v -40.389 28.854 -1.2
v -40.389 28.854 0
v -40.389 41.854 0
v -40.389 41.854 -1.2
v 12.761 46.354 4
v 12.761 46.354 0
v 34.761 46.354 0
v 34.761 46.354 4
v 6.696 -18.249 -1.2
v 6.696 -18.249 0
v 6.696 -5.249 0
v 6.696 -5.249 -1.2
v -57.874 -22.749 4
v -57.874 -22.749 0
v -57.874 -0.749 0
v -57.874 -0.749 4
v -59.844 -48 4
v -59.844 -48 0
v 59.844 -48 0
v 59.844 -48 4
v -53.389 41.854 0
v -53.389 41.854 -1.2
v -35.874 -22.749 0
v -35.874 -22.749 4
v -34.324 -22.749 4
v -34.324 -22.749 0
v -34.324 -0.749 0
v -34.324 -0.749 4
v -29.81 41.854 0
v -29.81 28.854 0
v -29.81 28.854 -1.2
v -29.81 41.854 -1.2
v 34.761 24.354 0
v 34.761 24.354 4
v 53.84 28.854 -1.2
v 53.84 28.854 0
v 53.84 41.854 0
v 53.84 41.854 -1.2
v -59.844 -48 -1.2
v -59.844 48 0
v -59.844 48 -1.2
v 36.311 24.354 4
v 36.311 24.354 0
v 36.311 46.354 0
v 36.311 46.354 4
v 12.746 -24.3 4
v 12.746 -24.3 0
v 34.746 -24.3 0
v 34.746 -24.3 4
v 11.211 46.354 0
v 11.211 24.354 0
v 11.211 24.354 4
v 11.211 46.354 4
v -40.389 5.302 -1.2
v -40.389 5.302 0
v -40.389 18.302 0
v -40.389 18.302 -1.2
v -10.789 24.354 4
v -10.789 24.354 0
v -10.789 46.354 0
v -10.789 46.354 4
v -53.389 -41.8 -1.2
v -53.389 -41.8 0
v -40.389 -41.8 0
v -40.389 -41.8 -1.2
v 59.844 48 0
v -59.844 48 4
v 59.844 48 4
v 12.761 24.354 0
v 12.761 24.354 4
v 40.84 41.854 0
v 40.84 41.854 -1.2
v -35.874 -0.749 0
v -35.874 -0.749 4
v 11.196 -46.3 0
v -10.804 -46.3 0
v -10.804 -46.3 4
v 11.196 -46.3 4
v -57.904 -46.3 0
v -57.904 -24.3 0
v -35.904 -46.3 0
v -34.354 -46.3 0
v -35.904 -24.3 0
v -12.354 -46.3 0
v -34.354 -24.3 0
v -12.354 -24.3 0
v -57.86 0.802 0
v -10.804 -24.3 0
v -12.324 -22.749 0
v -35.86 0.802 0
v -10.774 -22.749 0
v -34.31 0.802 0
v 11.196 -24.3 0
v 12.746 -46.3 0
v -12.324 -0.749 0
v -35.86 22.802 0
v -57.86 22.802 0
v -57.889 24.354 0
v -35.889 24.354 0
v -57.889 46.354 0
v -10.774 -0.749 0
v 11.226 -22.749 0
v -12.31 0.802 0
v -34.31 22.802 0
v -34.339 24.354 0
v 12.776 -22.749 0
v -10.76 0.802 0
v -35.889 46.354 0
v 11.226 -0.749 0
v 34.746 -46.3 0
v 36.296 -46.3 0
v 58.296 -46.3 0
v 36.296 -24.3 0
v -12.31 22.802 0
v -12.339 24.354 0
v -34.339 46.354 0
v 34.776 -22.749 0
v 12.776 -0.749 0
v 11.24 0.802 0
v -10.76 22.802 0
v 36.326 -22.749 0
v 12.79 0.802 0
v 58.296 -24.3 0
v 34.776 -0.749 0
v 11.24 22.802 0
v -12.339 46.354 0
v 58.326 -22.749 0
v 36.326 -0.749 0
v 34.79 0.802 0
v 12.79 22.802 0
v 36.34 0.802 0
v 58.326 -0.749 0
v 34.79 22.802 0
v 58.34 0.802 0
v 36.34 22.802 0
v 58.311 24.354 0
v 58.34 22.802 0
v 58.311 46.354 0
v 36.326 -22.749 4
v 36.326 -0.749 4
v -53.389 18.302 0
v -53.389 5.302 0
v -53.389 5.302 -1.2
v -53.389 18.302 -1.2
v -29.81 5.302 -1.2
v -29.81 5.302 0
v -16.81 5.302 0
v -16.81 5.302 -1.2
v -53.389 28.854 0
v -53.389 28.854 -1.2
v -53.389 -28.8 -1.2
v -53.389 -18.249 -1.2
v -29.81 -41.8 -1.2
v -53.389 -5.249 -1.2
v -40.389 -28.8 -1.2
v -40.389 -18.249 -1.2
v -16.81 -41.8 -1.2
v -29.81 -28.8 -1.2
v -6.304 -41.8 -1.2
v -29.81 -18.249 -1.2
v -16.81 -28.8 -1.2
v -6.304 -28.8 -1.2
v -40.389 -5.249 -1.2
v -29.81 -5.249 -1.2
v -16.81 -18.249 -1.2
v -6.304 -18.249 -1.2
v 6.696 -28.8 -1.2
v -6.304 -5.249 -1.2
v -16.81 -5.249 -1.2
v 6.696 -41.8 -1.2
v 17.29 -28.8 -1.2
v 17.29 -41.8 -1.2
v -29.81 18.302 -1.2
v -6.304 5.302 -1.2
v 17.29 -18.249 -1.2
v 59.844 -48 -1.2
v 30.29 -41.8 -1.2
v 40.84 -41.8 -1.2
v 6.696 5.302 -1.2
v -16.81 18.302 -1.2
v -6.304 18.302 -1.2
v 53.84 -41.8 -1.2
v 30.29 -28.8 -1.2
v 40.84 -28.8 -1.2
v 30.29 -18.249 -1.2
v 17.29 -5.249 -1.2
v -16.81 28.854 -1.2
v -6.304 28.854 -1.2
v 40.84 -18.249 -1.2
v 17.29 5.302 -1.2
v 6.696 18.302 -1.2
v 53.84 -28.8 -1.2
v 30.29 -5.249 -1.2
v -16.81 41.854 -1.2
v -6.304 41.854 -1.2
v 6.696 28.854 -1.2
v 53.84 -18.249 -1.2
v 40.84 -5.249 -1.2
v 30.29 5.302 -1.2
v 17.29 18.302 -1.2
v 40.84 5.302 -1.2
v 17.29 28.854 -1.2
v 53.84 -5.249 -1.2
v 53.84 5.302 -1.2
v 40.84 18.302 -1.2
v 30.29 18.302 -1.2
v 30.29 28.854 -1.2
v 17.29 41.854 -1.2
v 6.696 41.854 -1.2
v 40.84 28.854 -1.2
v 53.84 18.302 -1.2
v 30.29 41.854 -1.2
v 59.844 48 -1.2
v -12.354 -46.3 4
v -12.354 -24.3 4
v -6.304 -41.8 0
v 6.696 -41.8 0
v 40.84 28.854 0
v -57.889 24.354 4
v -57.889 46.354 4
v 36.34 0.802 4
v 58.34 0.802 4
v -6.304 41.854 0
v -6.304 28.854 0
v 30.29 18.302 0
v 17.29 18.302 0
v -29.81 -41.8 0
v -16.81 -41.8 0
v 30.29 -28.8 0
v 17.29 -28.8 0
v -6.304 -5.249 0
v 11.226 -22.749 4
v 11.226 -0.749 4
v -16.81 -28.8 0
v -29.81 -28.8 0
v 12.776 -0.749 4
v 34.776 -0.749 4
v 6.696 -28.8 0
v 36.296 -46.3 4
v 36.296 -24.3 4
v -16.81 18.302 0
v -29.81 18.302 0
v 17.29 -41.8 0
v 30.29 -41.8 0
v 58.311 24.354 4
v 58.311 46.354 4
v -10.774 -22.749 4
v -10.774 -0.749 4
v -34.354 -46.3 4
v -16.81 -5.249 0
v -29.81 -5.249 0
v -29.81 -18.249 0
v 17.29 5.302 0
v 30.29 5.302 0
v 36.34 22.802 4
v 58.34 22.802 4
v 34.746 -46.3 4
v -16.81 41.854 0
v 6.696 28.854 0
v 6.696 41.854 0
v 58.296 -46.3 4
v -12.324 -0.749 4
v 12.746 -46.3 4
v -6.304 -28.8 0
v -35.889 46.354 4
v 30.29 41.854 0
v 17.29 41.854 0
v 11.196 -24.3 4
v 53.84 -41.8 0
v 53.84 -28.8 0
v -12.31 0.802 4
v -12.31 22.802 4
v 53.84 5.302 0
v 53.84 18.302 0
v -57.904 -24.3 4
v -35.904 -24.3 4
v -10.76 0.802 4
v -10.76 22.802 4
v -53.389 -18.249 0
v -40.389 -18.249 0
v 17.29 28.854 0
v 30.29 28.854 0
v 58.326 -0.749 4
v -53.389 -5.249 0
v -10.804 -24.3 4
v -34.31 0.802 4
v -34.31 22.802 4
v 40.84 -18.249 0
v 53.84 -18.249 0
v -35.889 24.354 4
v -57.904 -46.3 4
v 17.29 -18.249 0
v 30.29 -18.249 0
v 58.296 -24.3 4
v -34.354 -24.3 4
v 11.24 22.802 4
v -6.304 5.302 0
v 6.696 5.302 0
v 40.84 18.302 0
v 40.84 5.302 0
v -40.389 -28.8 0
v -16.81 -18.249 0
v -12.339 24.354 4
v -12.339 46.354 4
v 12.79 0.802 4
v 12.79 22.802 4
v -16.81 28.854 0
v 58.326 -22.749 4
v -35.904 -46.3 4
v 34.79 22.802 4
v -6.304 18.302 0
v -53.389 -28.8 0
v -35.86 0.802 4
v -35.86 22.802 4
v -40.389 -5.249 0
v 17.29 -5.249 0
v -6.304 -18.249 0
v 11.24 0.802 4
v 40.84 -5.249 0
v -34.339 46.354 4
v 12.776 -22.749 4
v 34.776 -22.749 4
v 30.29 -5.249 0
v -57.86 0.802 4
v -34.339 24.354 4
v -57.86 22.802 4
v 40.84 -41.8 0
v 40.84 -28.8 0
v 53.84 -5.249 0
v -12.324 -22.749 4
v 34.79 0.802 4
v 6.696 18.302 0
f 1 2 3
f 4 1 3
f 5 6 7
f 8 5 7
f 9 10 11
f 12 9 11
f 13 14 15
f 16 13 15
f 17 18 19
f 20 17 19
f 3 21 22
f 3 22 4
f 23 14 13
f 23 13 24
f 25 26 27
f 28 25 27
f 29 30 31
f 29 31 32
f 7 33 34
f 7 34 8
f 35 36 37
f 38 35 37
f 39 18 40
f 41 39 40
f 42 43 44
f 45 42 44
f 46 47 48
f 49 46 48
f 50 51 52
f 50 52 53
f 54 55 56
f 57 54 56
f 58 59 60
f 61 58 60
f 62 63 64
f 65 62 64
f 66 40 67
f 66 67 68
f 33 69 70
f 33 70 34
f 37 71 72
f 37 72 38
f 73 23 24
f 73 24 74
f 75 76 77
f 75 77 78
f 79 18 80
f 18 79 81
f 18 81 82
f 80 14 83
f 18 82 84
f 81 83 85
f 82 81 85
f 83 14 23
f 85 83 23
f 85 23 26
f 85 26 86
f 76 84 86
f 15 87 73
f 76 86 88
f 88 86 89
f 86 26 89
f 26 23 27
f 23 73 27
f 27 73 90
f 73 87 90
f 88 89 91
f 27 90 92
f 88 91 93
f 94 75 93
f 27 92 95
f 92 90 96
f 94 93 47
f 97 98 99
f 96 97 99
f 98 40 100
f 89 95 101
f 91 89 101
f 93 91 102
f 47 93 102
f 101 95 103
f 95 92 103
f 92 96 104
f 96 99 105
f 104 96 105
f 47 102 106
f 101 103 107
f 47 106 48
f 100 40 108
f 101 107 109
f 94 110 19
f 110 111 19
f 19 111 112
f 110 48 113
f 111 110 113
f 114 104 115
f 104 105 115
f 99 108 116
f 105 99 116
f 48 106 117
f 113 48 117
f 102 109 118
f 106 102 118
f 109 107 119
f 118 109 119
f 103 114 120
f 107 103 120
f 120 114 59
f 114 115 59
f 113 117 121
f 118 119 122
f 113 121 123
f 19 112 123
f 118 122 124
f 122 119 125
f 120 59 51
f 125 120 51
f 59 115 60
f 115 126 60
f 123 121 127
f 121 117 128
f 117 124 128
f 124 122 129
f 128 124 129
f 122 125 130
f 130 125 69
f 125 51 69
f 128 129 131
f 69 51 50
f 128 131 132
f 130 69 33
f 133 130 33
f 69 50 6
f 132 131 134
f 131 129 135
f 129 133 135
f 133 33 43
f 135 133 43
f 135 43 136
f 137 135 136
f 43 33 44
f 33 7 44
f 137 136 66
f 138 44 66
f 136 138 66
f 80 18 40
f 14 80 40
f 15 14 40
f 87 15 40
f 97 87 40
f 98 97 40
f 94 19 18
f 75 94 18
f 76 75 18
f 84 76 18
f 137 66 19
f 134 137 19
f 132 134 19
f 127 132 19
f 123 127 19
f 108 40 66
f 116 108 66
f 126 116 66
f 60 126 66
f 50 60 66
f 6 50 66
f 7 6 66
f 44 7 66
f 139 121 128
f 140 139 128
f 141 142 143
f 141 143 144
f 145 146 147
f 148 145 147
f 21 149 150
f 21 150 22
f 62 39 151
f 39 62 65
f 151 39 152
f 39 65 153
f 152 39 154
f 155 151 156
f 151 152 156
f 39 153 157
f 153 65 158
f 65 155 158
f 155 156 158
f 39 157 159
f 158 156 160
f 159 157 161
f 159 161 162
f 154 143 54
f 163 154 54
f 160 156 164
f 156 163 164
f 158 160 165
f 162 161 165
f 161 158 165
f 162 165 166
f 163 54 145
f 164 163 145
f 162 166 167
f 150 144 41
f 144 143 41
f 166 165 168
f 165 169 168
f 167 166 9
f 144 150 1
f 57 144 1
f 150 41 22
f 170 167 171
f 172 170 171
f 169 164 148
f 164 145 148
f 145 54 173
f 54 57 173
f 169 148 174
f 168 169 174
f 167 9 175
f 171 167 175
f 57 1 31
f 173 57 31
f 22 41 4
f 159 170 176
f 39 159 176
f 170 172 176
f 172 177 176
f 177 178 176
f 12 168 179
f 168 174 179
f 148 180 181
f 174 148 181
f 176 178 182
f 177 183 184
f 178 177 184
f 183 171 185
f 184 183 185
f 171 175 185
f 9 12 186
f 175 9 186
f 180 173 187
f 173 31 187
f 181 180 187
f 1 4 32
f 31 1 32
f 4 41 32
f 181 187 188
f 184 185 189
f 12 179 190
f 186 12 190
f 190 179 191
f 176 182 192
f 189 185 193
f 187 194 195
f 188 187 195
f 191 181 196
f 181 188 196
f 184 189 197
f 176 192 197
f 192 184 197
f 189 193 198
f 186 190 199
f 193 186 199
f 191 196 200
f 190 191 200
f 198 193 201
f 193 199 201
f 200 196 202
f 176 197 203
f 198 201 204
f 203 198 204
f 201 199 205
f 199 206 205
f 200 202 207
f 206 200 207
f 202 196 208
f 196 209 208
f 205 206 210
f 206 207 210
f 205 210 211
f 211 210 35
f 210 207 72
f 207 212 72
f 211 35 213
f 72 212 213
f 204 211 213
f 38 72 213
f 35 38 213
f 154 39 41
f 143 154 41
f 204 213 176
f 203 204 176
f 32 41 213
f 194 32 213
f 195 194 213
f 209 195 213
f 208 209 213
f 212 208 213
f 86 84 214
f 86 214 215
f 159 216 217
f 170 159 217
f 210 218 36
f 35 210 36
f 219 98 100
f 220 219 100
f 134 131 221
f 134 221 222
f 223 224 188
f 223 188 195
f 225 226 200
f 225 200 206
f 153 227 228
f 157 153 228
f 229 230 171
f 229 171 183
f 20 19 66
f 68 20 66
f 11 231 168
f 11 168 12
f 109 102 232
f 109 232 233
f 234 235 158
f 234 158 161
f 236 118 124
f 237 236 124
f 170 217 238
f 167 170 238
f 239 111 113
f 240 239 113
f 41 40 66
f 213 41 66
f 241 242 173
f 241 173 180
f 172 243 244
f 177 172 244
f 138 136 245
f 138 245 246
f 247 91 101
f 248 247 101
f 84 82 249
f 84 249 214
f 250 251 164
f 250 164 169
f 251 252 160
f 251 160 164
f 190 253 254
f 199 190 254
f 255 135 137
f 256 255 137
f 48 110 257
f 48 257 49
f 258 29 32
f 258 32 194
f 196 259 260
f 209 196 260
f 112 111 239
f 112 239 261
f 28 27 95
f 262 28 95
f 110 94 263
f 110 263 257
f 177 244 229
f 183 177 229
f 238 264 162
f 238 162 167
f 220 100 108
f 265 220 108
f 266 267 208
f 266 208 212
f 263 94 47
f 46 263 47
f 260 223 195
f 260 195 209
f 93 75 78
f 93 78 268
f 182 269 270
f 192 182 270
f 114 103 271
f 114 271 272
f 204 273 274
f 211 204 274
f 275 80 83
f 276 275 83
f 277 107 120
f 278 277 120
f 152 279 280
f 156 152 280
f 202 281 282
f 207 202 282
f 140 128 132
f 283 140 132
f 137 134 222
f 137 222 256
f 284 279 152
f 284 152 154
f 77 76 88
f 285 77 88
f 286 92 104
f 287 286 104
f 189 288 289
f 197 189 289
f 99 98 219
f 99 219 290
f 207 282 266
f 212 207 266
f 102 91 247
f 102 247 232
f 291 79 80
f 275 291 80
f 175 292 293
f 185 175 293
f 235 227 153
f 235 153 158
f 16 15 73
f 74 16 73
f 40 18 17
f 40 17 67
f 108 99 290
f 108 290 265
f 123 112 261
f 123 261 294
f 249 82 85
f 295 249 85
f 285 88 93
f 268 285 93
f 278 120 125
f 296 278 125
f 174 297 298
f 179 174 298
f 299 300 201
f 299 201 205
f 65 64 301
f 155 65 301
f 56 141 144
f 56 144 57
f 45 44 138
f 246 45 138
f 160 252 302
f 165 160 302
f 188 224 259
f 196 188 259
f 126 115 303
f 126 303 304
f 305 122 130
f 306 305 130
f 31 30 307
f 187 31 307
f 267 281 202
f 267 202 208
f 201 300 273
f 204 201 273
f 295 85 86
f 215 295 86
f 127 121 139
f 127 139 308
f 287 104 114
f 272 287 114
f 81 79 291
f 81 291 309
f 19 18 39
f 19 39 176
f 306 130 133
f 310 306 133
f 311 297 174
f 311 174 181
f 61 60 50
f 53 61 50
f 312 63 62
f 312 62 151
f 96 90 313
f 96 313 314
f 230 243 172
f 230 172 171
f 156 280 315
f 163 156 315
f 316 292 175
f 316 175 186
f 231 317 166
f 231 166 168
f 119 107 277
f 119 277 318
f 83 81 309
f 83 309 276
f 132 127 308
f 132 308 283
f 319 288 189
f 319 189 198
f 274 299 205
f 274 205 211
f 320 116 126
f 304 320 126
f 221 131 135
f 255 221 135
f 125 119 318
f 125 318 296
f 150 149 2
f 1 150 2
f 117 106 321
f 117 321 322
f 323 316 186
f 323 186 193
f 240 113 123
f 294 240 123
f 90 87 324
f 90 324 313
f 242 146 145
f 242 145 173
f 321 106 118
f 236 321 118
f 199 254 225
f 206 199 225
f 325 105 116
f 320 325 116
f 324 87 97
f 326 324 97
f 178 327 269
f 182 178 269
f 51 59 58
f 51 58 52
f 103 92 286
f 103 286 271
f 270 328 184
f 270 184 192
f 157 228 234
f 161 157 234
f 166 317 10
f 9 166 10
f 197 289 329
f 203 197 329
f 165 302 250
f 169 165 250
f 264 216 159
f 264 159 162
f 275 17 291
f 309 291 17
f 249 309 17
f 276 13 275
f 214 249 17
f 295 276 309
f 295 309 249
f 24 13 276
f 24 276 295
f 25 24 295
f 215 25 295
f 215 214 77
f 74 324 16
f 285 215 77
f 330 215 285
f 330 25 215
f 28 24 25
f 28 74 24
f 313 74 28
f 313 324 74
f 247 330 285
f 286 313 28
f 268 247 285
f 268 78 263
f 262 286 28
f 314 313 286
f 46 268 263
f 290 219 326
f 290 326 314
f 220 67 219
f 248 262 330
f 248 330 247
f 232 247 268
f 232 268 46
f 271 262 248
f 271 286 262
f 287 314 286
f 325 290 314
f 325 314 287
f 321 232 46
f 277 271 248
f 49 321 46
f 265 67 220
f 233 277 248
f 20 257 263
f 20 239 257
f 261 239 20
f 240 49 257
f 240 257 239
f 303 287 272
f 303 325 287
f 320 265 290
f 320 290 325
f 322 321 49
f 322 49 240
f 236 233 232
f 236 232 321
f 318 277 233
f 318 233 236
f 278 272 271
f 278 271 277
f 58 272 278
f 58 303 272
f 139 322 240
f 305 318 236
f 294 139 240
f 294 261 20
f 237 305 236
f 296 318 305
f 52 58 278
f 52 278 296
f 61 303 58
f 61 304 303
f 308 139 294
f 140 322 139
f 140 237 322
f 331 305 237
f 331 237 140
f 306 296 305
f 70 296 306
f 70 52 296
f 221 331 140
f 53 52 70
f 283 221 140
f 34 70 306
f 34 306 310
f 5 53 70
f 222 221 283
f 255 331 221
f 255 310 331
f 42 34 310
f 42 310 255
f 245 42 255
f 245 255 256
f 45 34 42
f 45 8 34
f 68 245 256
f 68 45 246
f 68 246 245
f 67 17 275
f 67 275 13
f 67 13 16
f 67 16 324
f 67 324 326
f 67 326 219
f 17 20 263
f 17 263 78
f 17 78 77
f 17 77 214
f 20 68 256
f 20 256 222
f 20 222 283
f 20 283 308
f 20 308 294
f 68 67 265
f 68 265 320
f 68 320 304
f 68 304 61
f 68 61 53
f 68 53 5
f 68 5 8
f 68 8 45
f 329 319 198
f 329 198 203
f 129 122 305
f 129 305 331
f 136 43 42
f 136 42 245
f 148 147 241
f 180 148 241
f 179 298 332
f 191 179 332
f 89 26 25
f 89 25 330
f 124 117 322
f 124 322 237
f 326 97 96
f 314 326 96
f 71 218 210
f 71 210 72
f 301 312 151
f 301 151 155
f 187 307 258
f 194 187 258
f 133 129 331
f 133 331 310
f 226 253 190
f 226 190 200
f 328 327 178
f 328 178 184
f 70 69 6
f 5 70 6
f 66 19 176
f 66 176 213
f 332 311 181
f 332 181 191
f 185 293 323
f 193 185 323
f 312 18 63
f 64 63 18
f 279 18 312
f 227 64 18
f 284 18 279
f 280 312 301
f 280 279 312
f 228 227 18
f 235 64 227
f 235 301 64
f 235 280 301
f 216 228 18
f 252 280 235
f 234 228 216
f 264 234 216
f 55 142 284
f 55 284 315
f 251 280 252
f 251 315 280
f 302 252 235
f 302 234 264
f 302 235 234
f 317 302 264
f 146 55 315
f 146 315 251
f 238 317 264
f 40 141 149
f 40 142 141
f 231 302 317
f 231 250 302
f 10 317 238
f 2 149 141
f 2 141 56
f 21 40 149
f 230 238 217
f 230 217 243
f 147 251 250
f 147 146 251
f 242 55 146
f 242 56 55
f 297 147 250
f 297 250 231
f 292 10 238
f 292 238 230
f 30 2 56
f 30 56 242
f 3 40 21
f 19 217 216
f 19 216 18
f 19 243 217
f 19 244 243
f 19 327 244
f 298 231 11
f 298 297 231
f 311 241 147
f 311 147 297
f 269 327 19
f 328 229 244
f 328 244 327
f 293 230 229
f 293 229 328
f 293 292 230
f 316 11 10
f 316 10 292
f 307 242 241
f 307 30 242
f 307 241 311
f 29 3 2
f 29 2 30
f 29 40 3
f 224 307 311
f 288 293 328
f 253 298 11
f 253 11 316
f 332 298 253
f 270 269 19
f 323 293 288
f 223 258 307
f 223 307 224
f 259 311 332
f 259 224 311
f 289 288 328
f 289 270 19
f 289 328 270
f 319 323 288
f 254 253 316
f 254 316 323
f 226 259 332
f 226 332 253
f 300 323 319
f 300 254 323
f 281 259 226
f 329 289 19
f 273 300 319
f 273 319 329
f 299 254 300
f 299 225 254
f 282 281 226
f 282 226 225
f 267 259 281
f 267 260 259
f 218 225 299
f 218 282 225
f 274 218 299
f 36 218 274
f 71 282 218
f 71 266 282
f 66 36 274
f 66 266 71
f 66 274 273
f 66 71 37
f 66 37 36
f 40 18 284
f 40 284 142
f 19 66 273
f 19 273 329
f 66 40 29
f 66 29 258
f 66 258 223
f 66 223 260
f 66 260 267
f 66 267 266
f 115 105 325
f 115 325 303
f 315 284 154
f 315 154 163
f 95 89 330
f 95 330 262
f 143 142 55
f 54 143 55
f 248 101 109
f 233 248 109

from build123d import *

# Parameters (mm, degrees)
F0_W     = 119.688211
F0_H     = 96
F0_W_2   = 22
F0_H_2   = 22
F0_W_3   = 21.999999
F1_DEPTH = 4
F0_W_4   = 13
F0_H_3   = 13
F2_DEPTH = 1.2


with BuildPart() as f1:
    # F0 (on Top) → F1 (new body)
    with BuildSketch(Plane.XY):
        with Locations((-5e-07, 0)):
            Rectangle(F0_W, F0_H)
        with Locations((-46.903828, -35.3)):
            Rectangle(F0_W_2, F0_H_2, mode=Mode.SUBTRACT)
        with Locations((-23.353828, -35.3)):
            Rectangle(F0_W_2, F0_H_2, mode=Mode.SUBTRACT)
        with Locations((-46.8744295, -11.748823)):
            Rectangle(F0_W_3, F0_H_2, mode=Mode.SUBTRACT)
        with Locations((-23.32443, -11.748823)):
            Rectangle(F0_W_2, F0_H_2, mode=Mode.SUBTRACT)
        with Locations((0.196172, -35.3)):
            Rectangle(F0_W_2, F0_H_2, mode=Mode.SUBTRACT)
        with Locations((23.746172, -35.3)):
            Rectangle(F0_W_2, F0_H_2, mode=Mode.SUBTRACT)
        with Locations((47.296172, -35.3)):
            Rectangle(F0_W_2, F0_H_2, mode=Mode.SUBTRACT)
        with Locations((0.22557, -11.748823)):
            Rectangle(F0_W_2, F0_H_2, mode=Mode.SUBTRACT)
        with Locations((23.77557, -11.748823)):
            Rectangle(F0_W_2, F0_H_2, mode=Mode.SUBTRACT)
        with Locations((47.32557, -11.748823)):
            Rectangle(F0_W_2, F0_H_2, mode=Mode.SUBTRACT)
        with Locations((-46.859731, 11.802354)):
            Rectangle(F0_W_2, F0_H_2, mode=Mode.SUBTRACT)
        with Locations((-23.309731, 11.802354)):
            Rectangle(F0_W_2, F0_H_2, mode=Mode.SUBTRACT)
        with Locations((-46.889129, 35.35353)):
            Rectangle(F0_W_2, F0_H_2, mode=Mode.SUBTRACT)
        with Locations((-23.339129, 35.35353)):
            Rectangle(F0_W_2, F0_H_2, mode=Mode.SUBTRACT)
        with Locations((0.240269, 11.802354)):
            Rectangle(F0_W_2, F0_H_2, mode=Mode.SUBTRACT)
        with Locations((23.790269, 11.802354)):
            Rectangle(F0_W_2, F0_H_2, mode=Mode.SUBTRACT)
        with Locations((47.340269, 11.802354)):
            Rectangle(F0_W_2, F0_H_2, mode=Mode.SUBTRACT)
        with Locations((0.210871, 35.35353)):
            Rectangle(F0_W_2, F0_H_2, mode=Mode.SUBTRACT)
        with Locations((23.760871, 35.35353)):
            Rectangle(F0_W_2, F0_H_2, mode=Mode.SUBTRACT)
        with Locations((47.310871, 35.35353)):
            Rectangle(F0_W_2, F0_H_2, mode=Mode.SUBTRACT)
    extrude(amount=F1_DEPTH)


with BuildPart() as f2:
    # F0 (on Top) → F2 (new body)
    with BuildSketch(Plane.XY):
        with Locations((-5e-07, 0)):
            Rectangle(F0_W, F0_H)
        with Locations((-46.903828, -35.3)):
            Rectangle(F0_W_2, F0_H_2, mode=Mode.SUBTRACT)
        with Locations((-23.353828, -35.3)):
            Rectangle(F0_W_2, F0_H_2, mode=Mode.SUBTRACT)
        with Locations((-46.8744295, -11.748823)):
            Rectangle(F0_W_3, F0_H_2, mode=Mode.SUBTRACT)
        with Locations((-23.32443, -11.748823)):
            Rectangle(F0_W_2, F0_H_2, mode=Mode.SUBTRACT)
        with Locations((0.196172, -35.3)):
            Rectangle(F0_W_2, F0_H_2, mode=Mode.SUBTRACT)
        with Locations((23.746172, -35.3)):
            Rectangle(F0_W_2, F0_H_2, mode=Mode.SUBTRACT)
        with Locations((47.296172, -35.3)):
            Rectangle(F0_W_2, F0_H_2, mode=Mode.SUBTRACT)
        with Locations((0.22557, -11.748823)):
            Rectangle(F0_W_2, F0_H_2, mode=Mode.SUBTRACT)
        with Locations((23.77557, -11.748823)):
            Rectangle(F0_W_2, F0_H_2, mode=Mode.SUBTRACT)
        with Locations((47.32557, -11.748823)):
            Rectangle(F0_W_2, F0_H_2, mode=Mode.SUBTRACT)
        with Locations((-46.859731, 11.802354)):
            Rectangle(F0_W_2, F0_H_2, mode=Mode.SUBTRACT)
        with Locations((-23.309731, 11.802354)):
            Rectangle(F0_W_2, F0_H_2, mode=Mode.SUBTRACT)
        with Locations((-46.889129, 35.35353)):
            Rectangle(F0_W_2, F0_H_2, mode=Mode.SUBTRACT)
        with Locations((-23.339129, 35.35353)):
            Rectangle(F0_W_2, F0_H_2, mode=Mode.SUBTRACT)
        with Locations((0.240269, 11.802354)):
            Rectangle(F0_W_2, F0_H_2, mode=Mode.SUBTRACT)
        with Locations((23.790269, 11.802354)):
            Rectangle(F0_W_2, F0_H_2, mode=Mode.SUBTRACT)
        with Locations((47.340269, 11.802354)):
            Rectangle(F0_W_2, F0_H_2, mode=Mode.SUBTRACT)
        with Locations((0.210871, 35.35353)):
            Rectangle(F0_W_2, F0_H_2, mode=Mode.SUBTRACT)
        with Locations((23.760871, 35.35353)):
            Rectangle(F0_W_2, F0_H_2, mode=Mode.SUBTRACT)
        with Locations((47.310871, 35.35353)):
            Rectangle(F0_W_2, F0_H_2, mode=Mode.SUBTRACT)
        with Locations((23.746172, -35.3)):
            Rectangle(F0_W_2, F0_H_2)
        with Locations((23.790269, -35.299998)):
            Rectangle(F0_W_4, F0_H_3, mode=Mode.SUBTRACT)
        with Locations((-23.32443, -11.748823)):
            Rectangle(F0_W_2, F0_H_2)
        with Locations((-23.30973, -11.748822)):
            Rectangle(F0_W_4, F0_H_3, mode=Mode.SUBTRACT)
        with Locations((-46.889129, 35.35353)):
            Rectangle(F0_W_2, F0_H_2)
        with Locations((-46.889129, 35.35353)):
            Rectangle(F0_W_4, F0_H_3, mode=Mode.SUBTRACT)
        with Locations((47.310871, 35.35353)):
            Rectangle(F0_W_2, F0_H_2)
        with Locations((47.340269, 35.35353)):
            Rectangle(F0_W_4, F0_H_3, mode=Mode.SUBTRACT)
        with Locations((0.240269, 11.802354)):
            Rectangle(F0_W_2, F0_H_2)
        with Locations((0.196172, 11.802354)):
            Rectangle(F0_W_4, F0_H_3, mode=Mode.SUBTRACT)
        with Locations((-23.353828, -35.3)):
            Rectangle(F0_W_2, F0_H_2)
        with Locations((-23.30973, -35.299998)):
            Rectangle(F0_W_4, F0_H_3, mode=Mode.SUBTRACT)
        with Locations((-46.859731, 11.802354)):
            Rectangle(F0_W_2, F0_H_2)
        with Locations((-46.889129, 11.802354)):
            Rectangle(F0_W_4, F0_H_3, mode=Mode.SUBTRACT)
        with Locations((0.22557, -11.748823)):
            Rectangle(F0_W_2, F0_H_2)
        with Locations((0.196172, -11.748822)):
            Rectangle(F0_W_4, F0_H_3, mode=Mode.SUBTRACT)
        with Locations((47.340269, 11.802354)):
            Rectangle(F0_W_2, F0_H_2)
        with Locations((47.340269, 11.802354)):
            Rectangle(F0_W_4, F0_H_3, mode=Mode.SUBTRACT)
        with Locations((0.210871, 35.35353)):
            Rectangle(F0_W_2, F0_H_2)
        with Locations((0.196172, 35.35353)):
            Rectangle(F0_W_4, F0_H_3, mode=Mode.SUBTRACT)
        with Locations((47.32557, -11.748823)):
            Rectangle(F0_W_2, F0_H_2)
        with Locations((47.340269, -11.748822)):
            Rectangle(F0_W_4, F0_H_3, mode=Mode.SUBTRACT)
        with Locations((23.760871, 35.35353)):
            Rectangle(F0_W_2, F0_H_2)
        with Locations((23.790269, 35.35353)):
            Rectangle(F0_W_4, F0_H_3, mode=Mode.SUBTRACT)
        with Locations((47.296172, -35.3)):
            Rectangle(F0_W_2, F0_H_2)
        with Locations((47.340269, -35.299998)):
            Rectangle(F0_W_4, F0_H_3, mode=Mode.SUBTRACT)
        with Locations((-46.903828, -35.3)):
            Rectangle(F0_W_2, F0_H_2)
        with Locations((-46.889129, -35.299998)):
            Rectangle(F0_W_4, F0_H_3, mode=Mode.SUBTRACT)
        with Locations((23.790269, 11.802354)):
            Rectangle(F0_W_2, F0_H_2)
        with Locations((23.790269, 11.802354)):
            Rectangle(F0_W_4, F0_H_3, mode=Mode.SUBTRACT)
        with Locations((-23.339129, 35.35353)):
            Rectangle(F0_W_2, F0_H_2)
        with Locations((-23.30973, 35.35353)):
            Rectangle(F0_W_4, F0_H_3, mode=Mode.SUBTRACT)
        with Locations((23.77557, -11.748823)):
            Rectangle(F0_W_2, F0_H_2)
        with Locations((23.790269, -11.748822)):
            Rectangle(F0_W_4, F0_H_3, mode=Mode.SUBTRACT)
        with Locations((0.196172, -35.3)):
            Rectangle(F0_W_2, F0_H_2)
        with Locations((0.196172, -35.299998)):
            Rectangle(F0_W_4, F0_H_3, mode=Mode.SUBTRACT)
        with Locations((-23.309731, 11.802354)):
            Rectangle(F0_W_2, F0_H_2)
        with Locations((-23.30973, 11.802354)):
            Rectangle(F0_W_4, F0_H_3, mode=Mode.SUBTRACT)
        with Locations((-46.8744295, -11.748823)):
            Rectangle(F0_W_3, F0_H_2)
        with Locations((-46.889129, -11.748822)):
            Rectangle(F0_W_4, F0_H_3, mode=Mode.SUBTRACT)
    extrude(amount=-F2_DEPTH)


solid = Compound([f1.part, f2.part])
